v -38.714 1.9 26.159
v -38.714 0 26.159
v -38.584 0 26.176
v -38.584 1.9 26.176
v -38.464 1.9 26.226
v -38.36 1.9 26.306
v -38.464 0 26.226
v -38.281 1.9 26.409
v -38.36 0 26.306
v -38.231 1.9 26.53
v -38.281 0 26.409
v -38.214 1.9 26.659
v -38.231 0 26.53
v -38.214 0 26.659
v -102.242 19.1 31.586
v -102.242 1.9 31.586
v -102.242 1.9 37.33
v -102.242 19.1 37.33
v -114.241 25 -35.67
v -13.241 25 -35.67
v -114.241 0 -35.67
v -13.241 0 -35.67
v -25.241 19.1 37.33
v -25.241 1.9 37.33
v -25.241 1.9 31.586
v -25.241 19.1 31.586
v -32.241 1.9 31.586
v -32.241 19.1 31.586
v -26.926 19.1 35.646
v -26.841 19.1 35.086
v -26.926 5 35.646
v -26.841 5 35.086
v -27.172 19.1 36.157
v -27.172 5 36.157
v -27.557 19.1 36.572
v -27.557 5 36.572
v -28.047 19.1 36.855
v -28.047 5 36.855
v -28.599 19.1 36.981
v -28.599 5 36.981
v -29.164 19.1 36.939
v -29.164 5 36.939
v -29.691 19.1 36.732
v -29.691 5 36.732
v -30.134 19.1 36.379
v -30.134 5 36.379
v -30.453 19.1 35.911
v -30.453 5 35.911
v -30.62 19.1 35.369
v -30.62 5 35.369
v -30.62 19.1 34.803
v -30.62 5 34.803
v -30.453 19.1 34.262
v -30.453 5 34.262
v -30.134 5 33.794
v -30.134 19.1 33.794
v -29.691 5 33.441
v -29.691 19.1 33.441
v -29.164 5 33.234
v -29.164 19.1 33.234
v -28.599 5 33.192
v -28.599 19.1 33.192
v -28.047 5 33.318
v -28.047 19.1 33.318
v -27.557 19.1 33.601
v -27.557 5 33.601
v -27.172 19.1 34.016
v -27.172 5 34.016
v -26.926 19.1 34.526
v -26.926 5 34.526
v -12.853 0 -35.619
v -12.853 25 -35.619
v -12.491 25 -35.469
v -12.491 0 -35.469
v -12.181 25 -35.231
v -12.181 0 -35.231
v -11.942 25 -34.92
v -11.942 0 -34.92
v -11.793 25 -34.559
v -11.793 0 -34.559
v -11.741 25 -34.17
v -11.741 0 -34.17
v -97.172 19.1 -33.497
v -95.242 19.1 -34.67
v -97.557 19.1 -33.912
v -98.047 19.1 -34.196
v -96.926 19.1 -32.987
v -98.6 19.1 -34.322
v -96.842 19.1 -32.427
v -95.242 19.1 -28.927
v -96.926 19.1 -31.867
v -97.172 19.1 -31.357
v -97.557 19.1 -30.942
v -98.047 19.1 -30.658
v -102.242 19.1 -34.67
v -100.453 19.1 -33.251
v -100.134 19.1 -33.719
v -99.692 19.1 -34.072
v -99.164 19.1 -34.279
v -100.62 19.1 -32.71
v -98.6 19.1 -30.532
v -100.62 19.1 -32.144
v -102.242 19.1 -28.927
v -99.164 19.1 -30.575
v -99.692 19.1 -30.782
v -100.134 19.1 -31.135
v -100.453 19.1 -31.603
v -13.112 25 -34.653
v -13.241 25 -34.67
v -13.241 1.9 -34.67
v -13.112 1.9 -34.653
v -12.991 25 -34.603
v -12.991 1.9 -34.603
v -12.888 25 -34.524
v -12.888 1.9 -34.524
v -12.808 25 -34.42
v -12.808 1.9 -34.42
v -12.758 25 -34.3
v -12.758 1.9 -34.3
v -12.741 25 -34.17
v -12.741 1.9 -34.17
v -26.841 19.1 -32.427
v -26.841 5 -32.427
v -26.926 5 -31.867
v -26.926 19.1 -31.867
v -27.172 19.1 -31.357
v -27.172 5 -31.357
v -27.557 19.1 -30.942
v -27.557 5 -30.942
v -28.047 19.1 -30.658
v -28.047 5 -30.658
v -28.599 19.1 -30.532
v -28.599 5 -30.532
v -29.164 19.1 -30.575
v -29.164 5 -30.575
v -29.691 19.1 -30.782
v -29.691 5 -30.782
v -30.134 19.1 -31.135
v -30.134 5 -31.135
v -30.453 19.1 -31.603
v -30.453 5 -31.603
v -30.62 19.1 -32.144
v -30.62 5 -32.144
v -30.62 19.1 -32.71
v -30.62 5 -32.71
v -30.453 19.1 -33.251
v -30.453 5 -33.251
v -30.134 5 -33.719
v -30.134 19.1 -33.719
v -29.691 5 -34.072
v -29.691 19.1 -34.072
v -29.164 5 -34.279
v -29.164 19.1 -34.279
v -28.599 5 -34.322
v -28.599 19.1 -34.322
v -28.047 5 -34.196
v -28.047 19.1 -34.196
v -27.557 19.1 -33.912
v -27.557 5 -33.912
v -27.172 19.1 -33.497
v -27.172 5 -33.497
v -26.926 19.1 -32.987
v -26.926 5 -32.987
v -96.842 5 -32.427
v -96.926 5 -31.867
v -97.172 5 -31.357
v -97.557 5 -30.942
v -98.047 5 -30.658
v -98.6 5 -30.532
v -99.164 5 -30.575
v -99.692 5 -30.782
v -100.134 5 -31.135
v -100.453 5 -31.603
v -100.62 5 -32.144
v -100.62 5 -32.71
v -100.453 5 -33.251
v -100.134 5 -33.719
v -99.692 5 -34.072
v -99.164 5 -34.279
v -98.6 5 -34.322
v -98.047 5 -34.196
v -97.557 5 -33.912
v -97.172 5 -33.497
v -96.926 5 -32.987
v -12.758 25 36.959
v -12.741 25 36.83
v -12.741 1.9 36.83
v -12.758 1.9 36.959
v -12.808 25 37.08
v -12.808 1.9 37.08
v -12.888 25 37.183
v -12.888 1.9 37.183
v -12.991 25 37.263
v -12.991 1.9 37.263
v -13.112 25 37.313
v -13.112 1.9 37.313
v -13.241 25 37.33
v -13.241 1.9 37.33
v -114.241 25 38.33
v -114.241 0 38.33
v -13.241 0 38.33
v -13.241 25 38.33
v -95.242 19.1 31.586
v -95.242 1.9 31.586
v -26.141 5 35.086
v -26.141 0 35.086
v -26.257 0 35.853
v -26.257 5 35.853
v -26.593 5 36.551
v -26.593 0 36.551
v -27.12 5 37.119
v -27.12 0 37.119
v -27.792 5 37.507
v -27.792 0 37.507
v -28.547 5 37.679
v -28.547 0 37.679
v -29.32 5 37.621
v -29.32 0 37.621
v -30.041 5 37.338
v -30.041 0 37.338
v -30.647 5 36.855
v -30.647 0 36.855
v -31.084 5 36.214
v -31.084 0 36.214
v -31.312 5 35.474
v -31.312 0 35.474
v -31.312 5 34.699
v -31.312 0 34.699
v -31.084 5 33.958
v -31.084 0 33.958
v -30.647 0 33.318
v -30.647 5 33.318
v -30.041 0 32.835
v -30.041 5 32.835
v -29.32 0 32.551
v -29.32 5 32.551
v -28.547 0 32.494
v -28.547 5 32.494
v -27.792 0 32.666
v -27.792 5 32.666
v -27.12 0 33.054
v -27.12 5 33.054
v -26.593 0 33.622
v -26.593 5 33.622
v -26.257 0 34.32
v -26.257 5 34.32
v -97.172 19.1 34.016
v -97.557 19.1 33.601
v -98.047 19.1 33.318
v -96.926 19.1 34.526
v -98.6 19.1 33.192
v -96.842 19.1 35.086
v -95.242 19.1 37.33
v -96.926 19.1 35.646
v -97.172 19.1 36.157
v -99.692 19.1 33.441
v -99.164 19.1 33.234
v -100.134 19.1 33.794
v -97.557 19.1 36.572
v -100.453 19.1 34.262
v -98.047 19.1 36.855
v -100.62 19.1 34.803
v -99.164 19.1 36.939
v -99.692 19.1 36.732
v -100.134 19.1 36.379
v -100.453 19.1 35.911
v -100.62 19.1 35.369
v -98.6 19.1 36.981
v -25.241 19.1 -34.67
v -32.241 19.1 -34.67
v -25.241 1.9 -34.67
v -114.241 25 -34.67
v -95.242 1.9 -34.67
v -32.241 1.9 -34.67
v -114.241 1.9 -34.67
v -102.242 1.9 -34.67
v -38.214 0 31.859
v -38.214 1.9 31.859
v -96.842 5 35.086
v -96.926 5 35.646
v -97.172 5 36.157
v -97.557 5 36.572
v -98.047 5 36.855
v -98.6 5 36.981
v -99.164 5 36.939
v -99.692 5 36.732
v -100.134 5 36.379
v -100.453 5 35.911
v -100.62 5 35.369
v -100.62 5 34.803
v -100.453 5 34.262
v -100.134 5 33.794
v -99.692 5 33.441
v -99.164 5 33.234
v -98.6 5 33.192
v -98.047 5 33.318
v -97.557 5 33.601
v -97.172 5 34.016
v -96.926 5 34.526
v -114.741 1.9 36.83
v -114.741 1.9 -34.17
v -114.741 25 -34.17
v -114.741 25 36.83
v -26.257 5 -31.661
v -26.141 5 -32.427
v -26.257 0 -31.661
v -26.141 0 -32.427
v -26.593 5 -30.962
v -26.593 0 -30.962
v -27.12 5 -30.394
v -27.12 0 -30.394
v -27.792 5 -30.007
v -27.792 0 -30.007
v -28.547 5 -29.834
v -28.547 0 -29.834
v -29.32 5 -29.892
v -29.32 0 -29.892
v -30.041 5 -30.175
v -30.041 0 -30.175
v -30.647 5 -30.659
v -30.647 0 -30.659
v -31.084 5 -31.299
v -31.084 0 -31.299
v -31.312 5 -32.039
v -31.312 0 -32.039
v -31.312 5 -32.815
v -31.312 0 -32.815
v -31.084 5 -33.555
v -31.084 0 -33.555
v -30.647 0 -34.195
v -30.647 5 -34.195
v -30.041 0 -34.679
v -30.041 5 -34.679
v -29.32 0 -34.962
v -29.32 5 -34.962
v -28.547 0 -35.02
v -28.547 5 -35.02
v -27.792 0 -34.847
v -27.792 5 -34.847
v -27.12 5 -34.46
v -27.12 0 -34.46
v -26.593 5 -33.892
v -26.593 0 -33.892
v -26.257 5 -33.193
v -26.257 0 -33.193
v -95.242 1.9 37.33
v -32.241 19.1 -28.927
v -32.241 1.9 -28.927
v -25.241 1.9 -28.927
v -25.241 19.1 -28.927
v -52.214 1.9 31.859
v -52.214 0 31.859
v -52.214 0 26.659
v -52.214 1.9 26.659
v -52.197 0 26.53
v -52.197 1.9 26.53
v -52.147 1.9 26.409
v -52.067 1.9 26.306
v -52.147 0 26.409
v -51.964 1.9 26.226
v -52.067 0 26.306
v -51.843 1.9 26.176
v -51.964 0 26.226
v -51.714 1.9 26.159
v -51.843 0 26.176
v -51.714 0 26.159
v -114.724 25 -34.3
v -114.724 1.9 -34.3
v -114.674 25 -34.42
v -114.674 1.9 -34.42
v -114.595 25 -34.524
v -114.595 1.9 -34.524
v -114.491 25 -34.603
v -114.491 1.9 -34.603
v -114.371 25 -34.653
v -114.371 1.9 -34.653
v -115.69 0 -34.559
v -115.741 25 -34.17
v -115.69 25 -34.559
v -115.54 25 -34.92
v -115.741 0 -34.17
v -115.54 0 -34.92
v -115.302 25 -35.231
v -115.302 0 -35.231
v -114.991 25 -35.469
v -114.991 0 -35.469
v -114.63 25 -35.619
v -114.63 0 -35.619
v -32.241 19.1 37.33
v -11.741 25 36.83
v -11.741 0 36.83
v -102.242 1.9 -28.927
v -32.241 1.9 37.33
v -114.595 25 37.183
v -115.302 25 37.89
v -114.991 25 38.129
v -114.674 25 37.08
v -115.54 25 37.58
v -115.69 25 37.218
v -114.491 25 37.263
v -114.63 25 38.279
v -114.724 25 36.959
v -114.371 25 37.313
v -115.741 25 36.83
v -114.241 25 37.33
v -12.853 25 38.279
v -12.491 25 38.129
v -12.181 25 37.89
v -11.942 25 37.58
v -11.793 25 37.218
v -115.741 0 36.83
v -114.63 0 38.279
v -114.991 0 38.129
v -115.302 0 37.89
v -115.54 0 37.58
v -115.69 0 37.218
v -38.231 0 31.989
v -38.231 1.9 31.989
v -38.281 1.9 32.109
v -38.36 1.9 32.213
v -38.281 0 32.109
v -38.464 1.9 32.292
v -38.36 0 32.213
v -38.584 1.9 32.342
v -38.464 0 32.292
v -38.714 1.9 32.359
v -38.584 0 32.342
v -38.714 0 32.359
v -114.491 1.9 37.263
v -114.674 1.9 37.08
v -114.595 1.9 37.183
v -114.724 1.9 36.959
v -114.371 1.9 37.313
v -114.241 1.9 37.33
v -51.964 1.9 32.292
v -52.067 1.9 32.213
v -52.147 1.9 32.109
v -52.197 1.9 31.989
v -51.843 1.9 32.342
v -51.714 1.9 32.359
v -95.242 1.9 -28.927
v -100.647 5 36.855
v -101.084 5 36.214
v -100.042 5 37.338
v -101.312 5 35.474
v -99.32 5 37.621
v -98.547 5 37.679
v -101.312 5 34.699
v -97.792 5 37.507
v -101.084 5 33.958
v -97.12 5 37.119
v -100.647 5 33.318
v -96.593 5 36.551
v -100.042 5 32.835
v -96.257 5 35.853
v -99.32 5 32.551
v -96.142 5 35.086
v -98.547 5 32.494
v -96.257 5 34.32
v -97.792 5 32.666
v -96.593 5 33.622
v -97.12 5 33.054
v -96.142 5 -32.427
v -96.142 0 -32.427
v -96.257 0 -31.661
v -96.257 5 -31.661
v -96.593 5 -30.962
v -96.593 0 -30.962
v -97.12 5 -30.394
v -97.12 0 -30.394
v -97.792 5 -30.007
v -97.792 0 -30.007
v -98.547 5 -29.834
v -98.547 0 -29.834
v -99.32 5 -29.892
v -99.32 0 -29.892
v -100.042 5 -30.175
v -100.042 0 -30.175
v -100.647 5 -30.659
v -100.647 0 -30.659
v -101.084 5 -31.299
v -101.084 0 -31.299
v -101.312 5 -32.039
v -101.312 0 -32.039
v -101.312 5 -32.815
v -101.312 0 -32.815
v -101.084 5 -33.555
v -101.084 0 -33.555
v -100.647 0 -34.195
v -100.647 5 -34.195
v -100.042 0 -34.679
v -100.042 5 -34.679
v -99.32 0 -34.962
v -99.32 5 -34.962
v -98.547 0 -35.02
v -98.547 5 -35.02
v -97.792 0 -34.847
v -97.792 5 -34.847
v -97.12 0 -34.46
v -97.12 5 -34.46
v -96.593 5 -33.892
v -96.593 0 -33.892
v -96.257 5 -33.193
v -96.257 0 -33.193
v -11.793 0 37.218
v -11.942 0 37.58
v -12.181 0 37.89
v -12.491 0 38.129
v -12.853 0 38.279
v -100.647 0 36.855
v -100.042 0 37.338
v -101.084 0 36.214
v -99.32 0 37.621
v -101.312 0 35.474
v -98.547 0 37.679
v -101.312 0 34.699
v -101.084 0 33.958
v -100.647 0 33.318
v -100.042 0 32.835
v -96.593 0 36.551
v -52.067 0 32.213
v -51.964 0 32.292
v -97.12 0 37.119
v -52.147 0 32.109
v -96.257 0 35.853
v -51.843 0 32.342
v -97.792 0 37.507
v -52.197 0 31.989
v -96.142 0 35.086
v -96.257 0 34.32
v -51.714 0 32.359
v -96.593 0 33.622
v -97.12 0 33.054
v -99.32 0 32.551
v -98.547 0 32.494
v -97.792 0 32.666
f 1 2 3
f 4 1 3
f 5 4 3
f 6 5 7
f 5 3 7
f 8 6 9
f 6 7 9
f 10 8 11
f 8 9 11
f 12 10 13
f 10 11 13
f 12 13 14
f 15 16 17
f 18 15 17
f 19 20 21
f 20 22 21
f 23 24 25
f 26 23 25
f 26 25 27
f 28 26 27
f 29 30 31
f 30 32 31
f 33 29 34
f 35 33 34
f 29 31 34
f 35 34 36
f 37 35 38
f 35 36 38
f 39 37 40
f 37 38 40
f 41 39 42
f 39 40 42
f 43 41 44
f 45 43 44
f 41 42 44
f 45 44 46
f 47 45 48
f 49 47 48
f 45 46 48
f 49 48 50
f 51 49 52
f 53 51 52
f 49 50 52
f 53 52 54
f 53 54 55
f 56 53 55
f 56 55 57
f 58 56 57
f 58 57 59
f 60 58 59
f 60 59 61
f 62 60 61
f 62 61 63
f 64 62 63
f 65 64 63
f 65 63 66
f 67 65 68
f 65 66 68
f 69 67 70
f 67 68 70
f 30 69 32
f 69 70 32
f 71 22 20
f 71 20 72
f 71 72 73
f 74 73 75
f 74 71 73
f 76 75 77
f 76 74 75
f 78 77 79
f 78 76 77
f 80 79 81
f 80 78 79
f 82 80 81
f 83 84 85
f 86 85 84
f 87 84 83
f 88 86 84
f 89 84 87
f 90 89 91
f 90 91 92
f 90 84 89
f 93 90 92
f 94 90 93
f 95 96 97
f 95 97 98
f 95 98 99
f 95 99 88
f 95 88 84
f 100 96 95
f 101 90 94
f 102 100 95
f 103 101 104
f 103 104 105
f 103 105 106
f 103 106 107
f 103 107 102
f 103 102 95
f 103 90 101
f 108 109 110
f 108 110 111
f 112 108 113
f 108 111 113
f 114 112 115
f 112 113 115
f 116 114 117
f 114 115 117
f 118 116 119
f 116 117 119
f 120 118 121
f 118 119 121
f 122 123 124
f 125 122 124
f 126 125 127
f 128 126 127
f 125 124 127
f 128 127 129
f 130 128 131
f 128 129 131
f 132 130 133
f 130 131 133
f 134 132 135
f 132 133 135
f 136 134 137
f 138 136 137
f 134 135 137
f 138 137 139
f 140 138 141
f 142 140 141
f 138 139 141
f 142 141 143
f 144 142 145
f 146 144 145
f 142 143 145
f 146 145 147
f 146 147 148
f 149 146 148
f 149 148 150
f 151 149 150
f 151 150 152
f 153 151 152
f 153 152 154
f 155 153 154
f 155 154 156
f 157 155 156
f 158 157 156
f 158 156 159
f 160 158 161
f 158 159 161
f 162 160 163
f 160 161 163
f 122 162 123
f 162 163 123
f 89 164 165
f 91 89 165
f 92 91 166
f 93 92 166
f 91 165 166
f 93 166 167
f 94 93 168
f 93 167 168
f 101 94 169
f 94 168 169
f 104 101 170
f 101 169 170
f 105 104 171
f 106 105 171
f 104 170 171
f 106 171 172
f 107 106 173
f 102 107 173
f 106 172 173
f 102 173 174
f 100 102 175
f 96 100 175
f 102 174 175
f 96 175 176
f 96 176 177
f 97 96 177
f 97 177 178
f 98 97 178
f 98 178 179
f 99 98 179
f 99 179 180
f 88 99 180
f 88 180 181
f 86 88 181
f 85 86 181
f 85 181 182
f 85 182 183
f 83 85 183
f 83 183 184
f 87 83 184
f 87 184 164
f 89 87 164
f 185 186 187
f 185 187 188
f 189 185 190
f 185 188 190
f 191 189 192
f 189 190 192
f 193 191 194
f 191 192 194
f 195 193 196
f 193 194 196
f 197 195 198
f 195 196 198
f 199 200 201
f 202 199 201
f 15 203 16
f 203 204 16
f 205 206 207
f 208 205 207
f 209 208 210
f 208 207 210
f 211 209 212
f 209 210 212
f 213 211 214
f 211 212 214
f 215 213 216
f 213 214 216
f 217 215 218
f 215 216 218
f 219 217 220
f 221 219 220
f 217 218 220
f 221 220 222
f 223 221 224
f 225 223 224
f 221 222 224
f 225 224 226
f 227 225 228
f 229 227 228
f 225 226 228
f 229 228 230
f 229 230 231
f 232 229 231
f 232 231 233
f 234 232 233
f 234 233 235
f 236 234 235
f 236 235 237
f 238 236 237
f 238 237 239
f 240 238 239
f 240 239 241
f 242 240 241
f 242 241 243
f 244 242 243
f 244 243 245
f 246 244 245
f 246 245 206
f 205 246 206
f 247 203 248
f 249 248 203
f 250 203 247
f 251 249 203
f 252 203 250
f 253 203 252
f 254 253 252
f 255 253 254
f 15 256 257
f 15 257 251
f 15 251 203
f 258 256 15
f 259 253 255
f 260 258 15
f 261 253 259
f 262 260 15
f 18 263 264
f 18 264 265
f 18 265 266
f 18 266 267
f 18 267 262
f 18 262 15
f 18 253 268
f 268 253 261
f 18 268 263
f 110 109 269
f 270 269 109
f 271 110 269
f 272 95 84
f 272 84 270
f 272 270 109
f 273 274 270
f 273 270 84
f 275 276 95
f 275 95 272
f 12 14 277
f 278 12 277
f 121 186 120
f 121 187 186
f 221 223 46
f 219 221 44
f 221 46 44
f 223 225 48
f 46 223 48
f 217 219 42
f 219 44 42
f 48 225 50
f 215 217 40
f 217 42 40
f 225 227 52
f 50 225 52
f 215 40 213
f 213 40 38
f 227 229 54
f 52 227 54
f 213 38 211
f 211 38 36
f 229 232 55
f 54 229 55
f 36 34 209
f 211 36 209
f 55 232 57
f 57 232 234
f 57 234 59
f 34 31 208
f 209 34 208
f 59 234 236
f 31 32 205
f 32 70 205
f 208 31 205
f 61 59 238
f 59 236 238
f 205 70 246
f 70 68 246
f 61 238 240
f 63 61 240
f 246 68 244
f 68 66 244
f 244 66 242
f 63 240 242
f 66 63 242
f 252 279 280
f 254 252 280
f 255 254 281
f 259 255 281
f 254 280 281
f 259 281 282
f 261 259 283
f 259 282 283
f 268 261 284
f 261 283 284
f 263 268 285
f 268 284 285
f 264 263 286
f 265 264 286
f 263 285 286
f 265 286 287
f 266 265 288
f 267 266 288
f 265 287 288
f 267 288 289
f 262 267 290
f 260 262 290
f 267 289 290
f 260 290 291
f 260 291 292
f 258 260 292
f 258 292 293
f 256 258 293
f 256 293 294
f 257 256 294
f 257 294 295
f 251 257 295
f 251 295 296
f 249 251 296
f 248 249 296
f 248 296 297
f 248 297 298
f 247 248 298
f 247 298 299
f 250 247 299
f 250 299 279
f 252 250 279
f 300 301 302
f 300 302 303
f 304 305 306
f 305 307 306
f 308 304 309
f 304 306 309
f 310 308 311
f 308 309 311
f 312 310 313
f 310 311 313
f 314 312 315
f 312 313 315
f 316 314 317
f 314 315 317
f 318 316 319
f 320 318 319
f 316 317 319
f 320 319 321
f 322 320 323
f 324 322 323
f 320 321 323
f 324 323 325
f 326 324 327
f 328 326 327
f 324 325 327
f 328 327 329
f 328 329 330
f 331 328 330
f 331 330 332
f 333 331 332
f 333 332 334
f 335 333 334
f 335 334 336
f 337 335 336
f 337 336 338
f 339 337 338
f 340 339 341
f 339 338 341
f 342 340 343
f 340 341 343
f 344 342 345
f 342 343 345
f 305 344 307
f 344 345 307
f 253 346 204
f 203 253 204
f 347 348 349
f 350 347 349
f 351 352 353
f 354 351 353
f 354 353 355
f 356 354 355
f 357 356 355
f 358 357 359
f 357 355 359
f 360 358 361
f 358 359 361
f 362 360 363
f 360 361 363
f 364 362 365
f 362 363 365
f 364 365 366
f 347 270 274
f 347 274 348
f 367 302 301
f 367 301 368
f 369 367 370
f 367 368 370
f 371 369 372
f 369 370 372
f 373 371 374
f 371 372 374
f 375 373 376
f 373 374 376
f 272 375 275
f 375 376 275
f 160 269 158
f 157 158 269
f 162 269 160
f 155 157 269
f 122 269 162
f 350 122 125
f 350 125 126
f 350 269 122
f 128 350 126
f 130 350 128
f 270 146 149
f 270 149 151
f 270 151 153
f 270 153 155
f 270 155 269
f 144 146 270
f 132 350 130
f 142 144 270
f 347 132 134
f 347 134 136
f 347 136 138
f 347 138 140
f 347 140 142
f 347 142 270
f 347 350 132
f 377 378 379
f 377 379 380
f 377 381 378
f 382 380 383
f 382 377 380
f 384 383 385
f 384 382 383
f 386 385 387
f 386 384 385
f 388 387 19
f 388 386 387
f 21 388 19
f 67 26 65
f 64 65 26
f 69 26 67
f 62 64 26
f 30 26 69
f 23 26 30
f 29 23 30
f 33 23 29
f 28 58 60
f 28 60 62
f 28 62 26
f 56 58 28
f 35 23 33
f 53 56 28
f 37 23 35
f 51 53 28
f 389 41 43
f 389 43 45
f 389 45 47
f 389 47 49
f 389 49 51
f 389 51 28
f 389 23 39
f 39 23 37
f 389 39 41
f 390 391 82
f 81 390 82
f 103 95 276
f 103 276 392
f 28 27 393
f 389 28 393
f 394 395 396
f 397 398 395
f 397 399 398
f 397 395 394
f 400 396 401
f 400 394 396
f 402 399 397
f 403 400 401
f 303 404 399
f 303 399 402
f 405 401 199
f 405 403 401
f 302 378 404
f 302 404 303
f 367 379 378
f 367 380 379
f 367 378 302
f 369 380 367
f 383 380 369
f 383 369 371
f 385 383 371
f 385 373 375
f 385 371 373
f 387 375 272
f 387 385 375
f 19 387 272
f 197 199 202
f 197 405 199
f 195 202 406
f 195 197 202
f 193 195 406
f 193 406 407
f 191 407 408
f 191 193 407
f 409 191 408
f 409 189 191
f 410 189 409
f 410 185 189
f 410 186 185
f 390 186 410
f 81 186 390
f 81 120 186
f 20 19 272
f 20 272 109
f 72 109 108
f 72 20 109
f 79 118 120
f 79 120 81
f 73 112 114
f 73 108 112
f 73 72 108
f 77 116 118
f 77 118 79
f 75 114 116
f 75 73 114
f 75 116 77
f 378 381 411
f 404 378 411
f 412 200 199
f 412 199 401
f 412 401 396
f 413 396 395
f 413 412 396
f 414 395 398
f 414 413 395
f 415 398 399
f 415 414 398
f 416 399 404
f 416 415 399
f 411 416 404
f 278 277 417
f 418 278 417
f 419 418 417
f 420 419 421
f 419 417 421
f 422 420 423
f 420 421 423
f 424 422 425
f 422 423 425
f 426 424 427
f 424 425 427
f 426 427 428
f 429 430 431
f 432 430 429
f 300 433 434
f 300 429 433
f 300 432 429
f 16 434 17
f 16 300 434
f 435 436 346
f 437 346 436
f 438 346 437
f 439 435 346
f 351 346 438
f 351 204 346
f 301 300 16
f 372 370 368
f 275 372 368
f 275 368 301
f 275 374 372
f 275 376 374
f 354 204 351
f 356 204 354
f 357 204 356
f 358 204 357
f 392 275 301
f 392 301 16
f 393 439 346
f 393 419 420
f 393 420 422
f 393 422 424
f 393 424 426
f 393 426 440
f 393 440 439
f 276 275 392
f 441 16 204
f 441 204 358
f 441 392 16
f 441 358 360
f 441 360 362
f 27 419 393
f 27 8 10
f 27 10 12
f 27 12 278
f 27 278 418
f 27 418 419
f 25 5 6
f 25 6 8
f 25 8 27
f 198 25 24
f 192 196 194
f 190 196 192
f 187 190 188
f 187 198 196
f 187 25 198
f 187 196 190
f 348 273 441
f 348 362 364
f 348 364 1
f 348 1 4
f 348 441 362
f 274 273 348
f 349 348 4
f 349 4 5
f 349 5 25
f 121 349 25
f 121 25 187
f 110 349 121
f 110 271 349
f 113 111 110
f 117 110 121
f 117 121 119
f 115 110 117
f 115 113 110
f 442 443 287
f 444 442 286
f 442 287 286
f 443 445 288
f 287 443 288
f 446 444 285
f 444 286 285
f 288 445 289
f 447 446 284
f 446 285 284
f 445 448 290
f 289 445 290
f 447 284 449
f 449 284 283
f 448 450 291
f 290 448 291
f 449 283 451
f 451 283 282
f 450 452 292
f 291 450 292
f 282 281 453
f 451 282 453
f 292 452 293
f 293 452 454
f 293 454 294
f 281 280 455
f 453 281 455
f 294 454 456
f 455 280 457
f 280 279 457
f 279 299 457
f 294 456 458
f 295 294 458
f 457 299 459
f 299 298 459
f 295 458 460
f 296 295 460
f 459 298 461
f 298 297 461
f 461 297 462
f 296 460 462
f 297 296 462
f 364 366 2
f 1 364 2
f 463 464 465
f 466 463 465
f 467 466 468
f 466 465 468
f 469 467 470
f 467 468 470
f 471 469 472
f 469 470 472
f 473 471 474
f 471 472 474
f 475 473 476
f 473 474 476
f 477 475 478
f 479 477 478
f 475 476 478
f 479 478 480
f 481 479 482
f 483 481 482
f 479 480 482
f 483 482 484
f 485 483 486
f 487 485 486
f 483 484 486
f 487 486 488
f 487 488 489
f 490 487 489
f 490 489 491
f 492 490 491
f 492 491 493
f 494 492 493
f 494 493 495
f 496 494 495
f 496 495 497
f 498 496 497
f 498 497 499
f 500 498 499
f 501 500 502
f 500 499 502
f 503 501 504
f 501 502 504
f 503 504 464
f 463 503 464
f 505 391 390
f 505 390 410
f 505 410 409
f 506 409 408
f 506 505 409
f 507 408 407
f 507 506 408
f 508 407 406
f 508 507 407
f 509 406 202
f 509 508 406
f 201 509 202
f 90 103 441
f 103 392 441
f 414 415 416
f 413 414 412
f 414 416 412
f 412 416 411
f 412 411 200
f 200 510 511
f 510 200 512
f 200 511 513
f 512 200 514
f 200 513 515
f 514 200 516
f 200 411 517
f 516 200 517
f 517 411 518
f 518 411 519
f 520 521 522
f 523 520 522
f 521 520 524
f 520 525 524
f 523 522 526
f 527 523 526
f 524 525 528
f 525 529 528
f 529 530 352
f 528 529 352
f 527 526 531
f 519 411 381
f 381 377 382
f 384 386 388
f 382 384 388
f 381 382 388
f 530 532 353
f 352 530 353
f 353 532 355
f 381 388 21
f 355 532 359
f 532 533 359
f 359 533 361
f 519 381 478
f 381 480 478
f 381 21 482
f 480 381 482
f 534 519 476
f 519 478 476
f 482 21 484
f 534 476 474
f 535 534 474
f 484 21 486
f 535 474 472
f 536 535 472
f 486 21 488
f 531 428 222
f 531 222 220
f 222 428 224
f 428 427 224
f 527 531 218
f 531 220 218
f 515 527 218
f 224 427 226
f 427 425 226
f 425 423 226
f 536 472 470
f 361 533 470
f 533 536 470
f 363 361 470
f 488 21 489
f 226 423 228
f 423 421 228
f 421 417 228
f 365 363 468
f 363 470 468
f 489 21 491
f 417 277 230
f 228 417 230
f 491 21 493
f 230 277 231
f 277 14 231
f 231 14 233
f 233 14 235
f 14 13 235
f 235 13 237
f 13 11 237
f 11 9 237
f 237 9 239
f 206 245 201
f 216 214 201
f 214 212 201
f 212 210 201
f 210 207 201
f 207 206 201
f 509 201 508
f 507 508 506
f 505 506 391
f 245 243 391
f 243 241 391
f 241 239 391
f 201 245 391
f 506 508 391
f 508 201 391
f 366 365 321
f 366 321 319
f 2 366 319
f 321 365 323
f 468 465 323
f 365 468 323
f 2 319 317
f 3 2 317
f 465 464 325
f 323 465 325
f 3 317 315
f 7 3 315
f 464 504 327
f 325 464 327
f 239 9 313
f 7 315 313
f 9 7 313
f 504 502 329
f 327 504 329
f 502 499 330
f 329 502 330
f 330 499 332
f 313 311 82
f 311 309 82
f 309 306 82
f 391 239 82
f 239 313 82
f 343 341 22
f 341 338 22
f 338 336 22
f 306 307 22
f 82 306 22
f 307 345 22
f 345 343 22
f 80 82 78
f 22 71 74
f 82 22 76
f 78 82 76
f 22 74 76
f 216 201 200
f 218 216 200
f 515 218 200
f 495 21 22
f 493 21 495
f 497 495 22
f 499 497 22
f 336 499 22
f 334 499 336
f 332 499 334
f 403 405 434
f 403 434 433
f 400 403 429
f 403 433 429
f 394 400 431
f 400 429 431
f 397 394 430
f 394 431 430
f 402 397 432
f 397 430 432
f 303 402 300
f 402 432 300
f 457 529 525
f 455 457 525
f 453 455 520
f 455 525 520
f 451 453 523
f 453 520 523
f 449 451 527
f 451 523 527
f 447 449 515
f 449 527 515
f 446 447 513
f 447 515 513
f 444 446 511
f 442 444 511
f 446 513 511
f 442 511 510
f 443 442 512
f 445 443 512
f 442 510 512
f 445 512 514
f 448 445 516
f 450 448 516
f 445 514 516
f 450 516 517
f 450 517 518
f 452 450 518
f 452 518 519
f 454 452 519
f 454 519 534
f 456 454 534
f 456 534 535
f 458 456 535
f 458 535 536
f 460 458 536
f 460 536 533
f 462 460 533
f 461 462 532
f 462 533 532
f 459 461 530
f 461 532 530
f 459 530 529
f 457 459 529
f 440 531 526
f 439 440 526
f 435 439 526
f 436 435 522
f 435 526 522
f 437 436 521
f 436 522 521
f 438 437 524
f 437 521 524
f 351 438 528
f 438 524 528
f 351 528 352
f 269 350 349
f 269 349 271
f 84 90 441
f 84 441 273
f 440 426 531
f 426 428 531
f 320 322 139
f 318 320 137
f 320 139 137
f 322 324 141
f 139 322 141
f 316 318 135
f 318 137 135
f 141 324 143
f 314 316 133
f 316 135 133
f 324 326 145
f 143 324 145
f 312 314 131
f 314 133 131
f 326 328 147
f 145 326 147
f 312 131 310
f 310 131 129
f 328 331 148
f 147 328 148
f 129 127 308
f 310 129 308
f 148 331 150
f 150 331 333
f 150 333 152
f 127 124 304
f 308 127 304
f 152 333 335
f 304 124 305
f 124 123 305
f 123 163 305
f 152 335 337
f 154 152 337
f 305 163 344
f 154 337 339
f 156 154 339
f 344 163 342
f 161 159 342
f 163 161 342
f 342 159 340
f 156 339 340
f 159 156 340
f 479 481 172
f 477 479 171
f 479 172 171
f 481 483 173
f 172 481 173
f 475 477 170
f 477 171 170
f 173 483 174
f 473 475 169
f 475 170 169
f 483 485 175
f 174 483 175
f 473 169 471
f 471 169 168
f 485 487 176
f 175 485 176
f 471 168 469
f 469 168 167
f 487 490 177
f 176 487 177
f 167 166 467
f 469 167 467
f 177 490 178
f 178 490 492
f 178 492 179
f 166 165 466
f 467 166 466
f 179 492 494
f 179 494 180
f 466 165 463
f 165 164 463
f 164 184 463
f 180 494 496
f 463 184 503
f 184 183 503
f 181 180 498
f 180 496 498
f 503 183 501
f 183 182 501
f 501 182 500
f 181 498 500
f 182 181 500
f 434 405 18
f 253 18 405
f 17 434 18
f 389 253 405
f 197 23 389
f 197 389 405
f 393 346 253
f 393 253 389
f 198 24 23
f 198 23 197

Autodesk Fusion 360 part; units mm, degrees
sketch "Sketch1" plane through (0, 0, 0) normal (0, 1, 0) x (1, 0, 0)
  arc A0 (-114.2414, 36.1703) -> (-116.2414, 34.1703) centre (-114.2414, 34.1703) ccw
  arc A1 (-114.2414, 36.1703) -> (-116.2414, 34.1703) centre (-114.2414, 34.1703) ccw
  arc A2 (-13.2414, -38.8297) -> (-11.2414, -36.8297) centre (-13.2414, -36.8297) ccw
  arc A3 (-116.2414, -36.8297) -> (-114.2414, -38.8297) centre (-114.2414, -36.8297) ccw
  arc A4 (-116.2414, -36.8297) -> (-114.2414, -38.8297) centre (-114.2414, -36.8297) ccw
  arc A5 (-13.2414, -38.8297) -> (-11.2414, -36.8297) centre (-13.2414, -36.8297) ccw
  circle A6 centre (-98.7415, -35.0863) radius 1.55
  circle A7 centre (-98.7415, 32.427) radius 1.55
  line L0 (-11.2414, -36.8297) -> (-11.2414, 34.1703)
  circle A8 centre (-28.7414, -35.0863) radius 1.55
  arc A9 (-11.2414, 34.1703) -> (-13.2414, 36.1703) centre (-13.2414, 34.1703) ccw
  arc A10 (-11.2414, 34.1703) -> (-13.2414, 36.1703) centre (-13.2414, 34.1703) ccw
  circle A11 centre (-28.7414, 32.427) radius 1.55
  line L1 (-116.2414, -36.8297) -> (-116.2414, 34.1703)
  line L2 (-13.2414, 36.1703) -> (-114.2414, 36.1703)
  line L3 (-114.2414, 36.1703) -> (-13.2414, 36.1703)
  line L4 (-114.2414, -38.8297) -> (-13.2414, -38.8297)
  line L5 (-116.2414, 34.1703) -> (-116.2414, -36.8297)
  line L6 (-11.2414, 34.1703) -> (-11.2414, -36.8297)
  line L7 (-13.2414, -38.8297) -> (-114.2414, -38.8297)
  line L8 (-12.7414, -36.8297) -> (-12.7414, 34.1703)
  arc A12 (-12.7414, 34.1703) -> (-13.2414, 34.6703) centre (-13.2414, 34.1703) ccw
  line L9 (-13.2414, 34.6703) -> (-114.2414, 34.6703)
  arc A13 (-114.2414, 34.6703) -> (-114.7414, 34.1703) centre (-114.2414, 34.1703) ccw
  line L10 (-114.7414, 34.1703) -> (-114.7414, -36.8297)
  arc A14 (-114.7414, -36.8297) -> (-114.2414, -37.3297) centre (-114.2414, -36.8297) ccw
  line L11 (-114.2414, -37.3297) -> (-13.2414, -37.3297)
  arc A15 (-13.2414, -37.3297) -> (-12.7414, -36.8297) centre (-13.2414, -36.8297) ccw
  circle A16 centre (-98.7415, -35.0863) radius 2.6
  circle A17 centre (-28.7414, -35.0863) radius 2.6
  circle A18 centre (-98.7415, 32.427) radius 2.6
  circle A19 centre (-28.7414, 32.427) radius 2.6
  circle A20 centre (-98.7415, -35.0863) radius 1.9
  circle A21 centre (-28.7414, -35.0863) radius 1.9
  circle A22 centre (-98.7415, 32.427) radius 1.9
  circle A23 centre (-28.7414, 32.427) radius 1.9
  line L12 (-11.7414, -36.8297) -> (-11.7414, 34.1703)
  arc A24 (-11.7414, 34.1703) -> (-13.2414, 35.6703) centre (-13.2414, 34.1703) ccw
  line L13 (-13.2414, 35.6703) -> (-114.2414, 35.6703)
  arc A25 (-114.2414, 35.6703) -> (-115.7414, 34.1703) centre (-114.2414, 34.1703) ccw
  line L14 (-115.7414, 34.1703) -> (-115.7414, -36.8297)
  arc A26 (-115.7414, -36.8297) -> (-114.2414, -38.3297) centre (-114.2414, -36.8297) ccw
  line L15 (-114.2414, -38.3297) -> (-13.2414, -38.3297)
  arc A27 (-13.2414, -38.3297) -> (-11.7414, -36.8297) centre (-13.2414, -36.8297) ccw
  line L16 (-38.2137, -26.6593) -> (-38.2137, -31.8593)
  line L17 (-38.7137, -32.3593) -> (-51.7137, -32.3593)
  arc A28 (-52.2137, -31.8593) -> (-51.7137, -32.3593) centre (-51.7137, -31.8593) ccw
  line L18 (-52.2137, -31.8593) -> (-52.2137, -26.6593)
  arc A29 (-38.2137, -26.6593) -> (-38.7137, -26.1593) centre (-38.7137, -26.6593) ccw
  line L19 (-51.7137, -26.1593) -> (-38.7137, -26.1593)
  arc A30 (-38.7137, -32.3593) -> (-38.2137, -31.8593) centre (-38.7137, -31.8593) ccw
  arc A31 (-51.7137, -26.1593) -> (-52.2137, -26.6593) centre (-51.7137, -26.6593) ccw
  point P0 (-38.2137, -32.3593)
  point P1 (-52.2137, -32.3593)
  point P2 (-52.2137, -26.1593)
  dimension "d1" = -1.5
  dimension "d16" = 5.2
  dimension "d17" = 5.2
  dimension "d18" = 5.2
  dimension "d19" = 5.2
  dimension "d22" = 3.8
  dimension "d23" = 3.8
  dimension "d24" = 3.8
  dimension "d25" = 3.8
  dimension "d28" = -0.5
  dimension "d31" = 6.2
  dimension "d32" = 14
  dimension "d33" = 0.5
  dimension "d34" = 0.5
  dimension "d35" = 0.5
extrude "Extrude1" add sketch "Sketch1" along normal blind 1.9 contours A0 A1 A2 A3 A4 A5 L0 A9 A10 L1 L2 L3 L4 L5 L6 L7 | L8 A12 L9 A13 L10 A14 L11 A15 A16 A17 A18 A19 | L11 A17 | L11 A17 | L9 A19 | L9 A19 | L11 A16 | L11 A16 | L9 A18 | L9 A18 | A20 | A21 | A22 | A23 | L12 A24 L13 A25 L14 A26 L15 A27 | L16 L17 A28 L18 A29 L19 A30 A31
extrude "Extrude2" add sketch "Sketch1" along normal blind 25 contours A0 A1 A2 A3 A4 A5 L0 A9 A10 L1 L2 L3 L4 L5 L6 L7 | L11 A17 | L9 A19 | L11 A16 | L9 A18 | L12 A24 L13 A25 L14 A26 L15 A27 picked at (-28.4059, -37.381) picked at (-28.6269, 34.8843) picked at (-98.406, -37.381) picked at (-98.9586, 34.8329)
sketch "Sketch2" plane through (0, 1.9, 0) normal (0, 1, 0) x (-1, 0, 0)
  line L0 (12.7414, 36.8297) -> (12.7414, -34.1703)
  arc A0 (12.7414, -34.1703) -> (13.2414, -34.6703) centre (13.2414, -34.1703) ccw
  line L1 (13.2414, -34.6703) -> (114.2414, -34.6703)
  arc A1 (114.2414, -34.6703) -> (114.7414, -34.1703) centre (114.2414, -34.1703) ccw
  line L2 (114.7414, -34.1703) -> (114.7414, 36.8297)
  arc A2 (114.7414, 36.8297) -> (114.2414, 37.3297) centre (114.2414, 36.8297) ccw
  line L3 (114.2414, 37.3297) -> (13.2414, 37.3297)
  arc A3 (13.2414, 37.3297) -> (12.7414, 36.8297) centre (13.2414, 36.8297) ccw
  circle A4 centre (98.7415, 35.0863) radius 1.55
  circle A5 centre (98.7415, -32.427) radius 1.55
  circle A6 centre (28.7414, -32.427) radius 1.55
  circle A7 centre (28.7414, 35.0863) radius 1.55
  line L4 (32.2414, 38.5863) -> (25.2414, 38.5863)
  line L5 (25.2414, 38.5863) -> (25.2414, 31.5863)
  line L6 (25.2414, 31.5863) -> (32.2414, 31.5863)
  line L7 (32.2414, 31.5863) -> (32.2414, 38.5863)
  line L8 (32.2414, 38.5863) -> (25.2414, 31.5863) construction
  line L9 (25.2414, 38.5863) -> (32.2414, 31.5863) construction
  line L10 (102.2415, 38.5863) -> (95.2415, 38.5863)
  line L11 (95.2415, 38.5863) -> (95.2415, 31.5863)
  line L12 (95.2415, 31.5863) -> (102.2415, 31.5863)
  line L13 (102.2415, 31.5863) -> (102.2415, 38.5863)
  line L14 (102.2415, 38.5863) -> (95.2415, 31.5863) construction
  line L15 (95.2415, 38.5863) -> (102.2415, 31.5863) construction
  line L16 (32.2414, -28.927) -> (25.2414, -28.927)
  line L17 (25.2414, -28.927) -> (25.2414, -35.927)
  line L18 (25.2414, -35.927) -> (32.2414, -35.927)
  line L19 (32.2414, -35.927) -> (32.2414, -28.927)
  line L20 (32.2414, -28.927) -> (25.2414, -35.927) construction
  line L21 (25.2414, -28.927) -> (32.2414, -35.927) construction
  line L22 (102.2415, -28.927) -> (95.2415, -28.927)
  line L23 (95.2415, -28.927) -> (95.2415, -35.927)
  line L24 (95.2415, -35.927) -> (102.2415, -35.927)
  line L25 (102.2415, -35.927) -> (102.2415, -28.927)
  line L26 (102.2415, -28.927) -> (95.2415, -35.927) construction
  line L27 (95.2415, -28.927) -> (102.2415, -35.927) construction
  point P0 (28.7414, 35.0863)
  point P1 (98.7415, 35.0863)
  point P2 (28.7414, -32.427)
  point P3 (98.7415, -32.427)
  dimension "d6" = 7
  dimension "d7" = 7
  dimension "d8" = 7
  dimension "d9" = 7
  dimension "d10" = 7
  dimension "d11" = 7
  dimension "d12" = 7
  dimension "d13" = 7
extrude "Extrude3" add sketch "Sketch2" along normal blind 17.2 contours L3 L5 L6 L7 | L1 L16 L17 L19 | L3 L11 L12 L13 | L1 L22 L23 L25
extrude "Extrude4" cut sketch "Sketch1" along normal blind 5 contours L11 A17 | L11 A17 | L9 A19 | L9 A19 | L11 A16 | L11 A16 | L9 A18 | L9 A18 | A20 | A21 | A22 | A23
extrude "Extrude5" cut sketch "Sketch1" along normal blind 38 contours A20 | A21 | A22 | A23
extrude "Extrude6" cut sketch "Sketch1" along normal blind 69 contours A0 A1 A2 A3 A4 A5 L0 A9 A10 L1 L2 L3 L4 L5 L6 L7
extrude "Extrude7" cut sketch "Sketch1" along normal blind 24 contours L16 L17 A28 L18 A29 L19 A30 A31
sketch "Sketch3" plane through (0, 0, 38.3297) normal (0, 0, 1) x (-1, 0, 0)
  line L0 (13.2414, -25) -> (114.2414, -25)
  line L1 (114.2414, -25) -> (114.2414, 0)
  line L2 (114.2414, 0) -> (13.2414, 0)
  line L3 (13.2414, 0) -> (13.2414, -25)
equation "d14 = 19.00 mm - 1.8 mm"
